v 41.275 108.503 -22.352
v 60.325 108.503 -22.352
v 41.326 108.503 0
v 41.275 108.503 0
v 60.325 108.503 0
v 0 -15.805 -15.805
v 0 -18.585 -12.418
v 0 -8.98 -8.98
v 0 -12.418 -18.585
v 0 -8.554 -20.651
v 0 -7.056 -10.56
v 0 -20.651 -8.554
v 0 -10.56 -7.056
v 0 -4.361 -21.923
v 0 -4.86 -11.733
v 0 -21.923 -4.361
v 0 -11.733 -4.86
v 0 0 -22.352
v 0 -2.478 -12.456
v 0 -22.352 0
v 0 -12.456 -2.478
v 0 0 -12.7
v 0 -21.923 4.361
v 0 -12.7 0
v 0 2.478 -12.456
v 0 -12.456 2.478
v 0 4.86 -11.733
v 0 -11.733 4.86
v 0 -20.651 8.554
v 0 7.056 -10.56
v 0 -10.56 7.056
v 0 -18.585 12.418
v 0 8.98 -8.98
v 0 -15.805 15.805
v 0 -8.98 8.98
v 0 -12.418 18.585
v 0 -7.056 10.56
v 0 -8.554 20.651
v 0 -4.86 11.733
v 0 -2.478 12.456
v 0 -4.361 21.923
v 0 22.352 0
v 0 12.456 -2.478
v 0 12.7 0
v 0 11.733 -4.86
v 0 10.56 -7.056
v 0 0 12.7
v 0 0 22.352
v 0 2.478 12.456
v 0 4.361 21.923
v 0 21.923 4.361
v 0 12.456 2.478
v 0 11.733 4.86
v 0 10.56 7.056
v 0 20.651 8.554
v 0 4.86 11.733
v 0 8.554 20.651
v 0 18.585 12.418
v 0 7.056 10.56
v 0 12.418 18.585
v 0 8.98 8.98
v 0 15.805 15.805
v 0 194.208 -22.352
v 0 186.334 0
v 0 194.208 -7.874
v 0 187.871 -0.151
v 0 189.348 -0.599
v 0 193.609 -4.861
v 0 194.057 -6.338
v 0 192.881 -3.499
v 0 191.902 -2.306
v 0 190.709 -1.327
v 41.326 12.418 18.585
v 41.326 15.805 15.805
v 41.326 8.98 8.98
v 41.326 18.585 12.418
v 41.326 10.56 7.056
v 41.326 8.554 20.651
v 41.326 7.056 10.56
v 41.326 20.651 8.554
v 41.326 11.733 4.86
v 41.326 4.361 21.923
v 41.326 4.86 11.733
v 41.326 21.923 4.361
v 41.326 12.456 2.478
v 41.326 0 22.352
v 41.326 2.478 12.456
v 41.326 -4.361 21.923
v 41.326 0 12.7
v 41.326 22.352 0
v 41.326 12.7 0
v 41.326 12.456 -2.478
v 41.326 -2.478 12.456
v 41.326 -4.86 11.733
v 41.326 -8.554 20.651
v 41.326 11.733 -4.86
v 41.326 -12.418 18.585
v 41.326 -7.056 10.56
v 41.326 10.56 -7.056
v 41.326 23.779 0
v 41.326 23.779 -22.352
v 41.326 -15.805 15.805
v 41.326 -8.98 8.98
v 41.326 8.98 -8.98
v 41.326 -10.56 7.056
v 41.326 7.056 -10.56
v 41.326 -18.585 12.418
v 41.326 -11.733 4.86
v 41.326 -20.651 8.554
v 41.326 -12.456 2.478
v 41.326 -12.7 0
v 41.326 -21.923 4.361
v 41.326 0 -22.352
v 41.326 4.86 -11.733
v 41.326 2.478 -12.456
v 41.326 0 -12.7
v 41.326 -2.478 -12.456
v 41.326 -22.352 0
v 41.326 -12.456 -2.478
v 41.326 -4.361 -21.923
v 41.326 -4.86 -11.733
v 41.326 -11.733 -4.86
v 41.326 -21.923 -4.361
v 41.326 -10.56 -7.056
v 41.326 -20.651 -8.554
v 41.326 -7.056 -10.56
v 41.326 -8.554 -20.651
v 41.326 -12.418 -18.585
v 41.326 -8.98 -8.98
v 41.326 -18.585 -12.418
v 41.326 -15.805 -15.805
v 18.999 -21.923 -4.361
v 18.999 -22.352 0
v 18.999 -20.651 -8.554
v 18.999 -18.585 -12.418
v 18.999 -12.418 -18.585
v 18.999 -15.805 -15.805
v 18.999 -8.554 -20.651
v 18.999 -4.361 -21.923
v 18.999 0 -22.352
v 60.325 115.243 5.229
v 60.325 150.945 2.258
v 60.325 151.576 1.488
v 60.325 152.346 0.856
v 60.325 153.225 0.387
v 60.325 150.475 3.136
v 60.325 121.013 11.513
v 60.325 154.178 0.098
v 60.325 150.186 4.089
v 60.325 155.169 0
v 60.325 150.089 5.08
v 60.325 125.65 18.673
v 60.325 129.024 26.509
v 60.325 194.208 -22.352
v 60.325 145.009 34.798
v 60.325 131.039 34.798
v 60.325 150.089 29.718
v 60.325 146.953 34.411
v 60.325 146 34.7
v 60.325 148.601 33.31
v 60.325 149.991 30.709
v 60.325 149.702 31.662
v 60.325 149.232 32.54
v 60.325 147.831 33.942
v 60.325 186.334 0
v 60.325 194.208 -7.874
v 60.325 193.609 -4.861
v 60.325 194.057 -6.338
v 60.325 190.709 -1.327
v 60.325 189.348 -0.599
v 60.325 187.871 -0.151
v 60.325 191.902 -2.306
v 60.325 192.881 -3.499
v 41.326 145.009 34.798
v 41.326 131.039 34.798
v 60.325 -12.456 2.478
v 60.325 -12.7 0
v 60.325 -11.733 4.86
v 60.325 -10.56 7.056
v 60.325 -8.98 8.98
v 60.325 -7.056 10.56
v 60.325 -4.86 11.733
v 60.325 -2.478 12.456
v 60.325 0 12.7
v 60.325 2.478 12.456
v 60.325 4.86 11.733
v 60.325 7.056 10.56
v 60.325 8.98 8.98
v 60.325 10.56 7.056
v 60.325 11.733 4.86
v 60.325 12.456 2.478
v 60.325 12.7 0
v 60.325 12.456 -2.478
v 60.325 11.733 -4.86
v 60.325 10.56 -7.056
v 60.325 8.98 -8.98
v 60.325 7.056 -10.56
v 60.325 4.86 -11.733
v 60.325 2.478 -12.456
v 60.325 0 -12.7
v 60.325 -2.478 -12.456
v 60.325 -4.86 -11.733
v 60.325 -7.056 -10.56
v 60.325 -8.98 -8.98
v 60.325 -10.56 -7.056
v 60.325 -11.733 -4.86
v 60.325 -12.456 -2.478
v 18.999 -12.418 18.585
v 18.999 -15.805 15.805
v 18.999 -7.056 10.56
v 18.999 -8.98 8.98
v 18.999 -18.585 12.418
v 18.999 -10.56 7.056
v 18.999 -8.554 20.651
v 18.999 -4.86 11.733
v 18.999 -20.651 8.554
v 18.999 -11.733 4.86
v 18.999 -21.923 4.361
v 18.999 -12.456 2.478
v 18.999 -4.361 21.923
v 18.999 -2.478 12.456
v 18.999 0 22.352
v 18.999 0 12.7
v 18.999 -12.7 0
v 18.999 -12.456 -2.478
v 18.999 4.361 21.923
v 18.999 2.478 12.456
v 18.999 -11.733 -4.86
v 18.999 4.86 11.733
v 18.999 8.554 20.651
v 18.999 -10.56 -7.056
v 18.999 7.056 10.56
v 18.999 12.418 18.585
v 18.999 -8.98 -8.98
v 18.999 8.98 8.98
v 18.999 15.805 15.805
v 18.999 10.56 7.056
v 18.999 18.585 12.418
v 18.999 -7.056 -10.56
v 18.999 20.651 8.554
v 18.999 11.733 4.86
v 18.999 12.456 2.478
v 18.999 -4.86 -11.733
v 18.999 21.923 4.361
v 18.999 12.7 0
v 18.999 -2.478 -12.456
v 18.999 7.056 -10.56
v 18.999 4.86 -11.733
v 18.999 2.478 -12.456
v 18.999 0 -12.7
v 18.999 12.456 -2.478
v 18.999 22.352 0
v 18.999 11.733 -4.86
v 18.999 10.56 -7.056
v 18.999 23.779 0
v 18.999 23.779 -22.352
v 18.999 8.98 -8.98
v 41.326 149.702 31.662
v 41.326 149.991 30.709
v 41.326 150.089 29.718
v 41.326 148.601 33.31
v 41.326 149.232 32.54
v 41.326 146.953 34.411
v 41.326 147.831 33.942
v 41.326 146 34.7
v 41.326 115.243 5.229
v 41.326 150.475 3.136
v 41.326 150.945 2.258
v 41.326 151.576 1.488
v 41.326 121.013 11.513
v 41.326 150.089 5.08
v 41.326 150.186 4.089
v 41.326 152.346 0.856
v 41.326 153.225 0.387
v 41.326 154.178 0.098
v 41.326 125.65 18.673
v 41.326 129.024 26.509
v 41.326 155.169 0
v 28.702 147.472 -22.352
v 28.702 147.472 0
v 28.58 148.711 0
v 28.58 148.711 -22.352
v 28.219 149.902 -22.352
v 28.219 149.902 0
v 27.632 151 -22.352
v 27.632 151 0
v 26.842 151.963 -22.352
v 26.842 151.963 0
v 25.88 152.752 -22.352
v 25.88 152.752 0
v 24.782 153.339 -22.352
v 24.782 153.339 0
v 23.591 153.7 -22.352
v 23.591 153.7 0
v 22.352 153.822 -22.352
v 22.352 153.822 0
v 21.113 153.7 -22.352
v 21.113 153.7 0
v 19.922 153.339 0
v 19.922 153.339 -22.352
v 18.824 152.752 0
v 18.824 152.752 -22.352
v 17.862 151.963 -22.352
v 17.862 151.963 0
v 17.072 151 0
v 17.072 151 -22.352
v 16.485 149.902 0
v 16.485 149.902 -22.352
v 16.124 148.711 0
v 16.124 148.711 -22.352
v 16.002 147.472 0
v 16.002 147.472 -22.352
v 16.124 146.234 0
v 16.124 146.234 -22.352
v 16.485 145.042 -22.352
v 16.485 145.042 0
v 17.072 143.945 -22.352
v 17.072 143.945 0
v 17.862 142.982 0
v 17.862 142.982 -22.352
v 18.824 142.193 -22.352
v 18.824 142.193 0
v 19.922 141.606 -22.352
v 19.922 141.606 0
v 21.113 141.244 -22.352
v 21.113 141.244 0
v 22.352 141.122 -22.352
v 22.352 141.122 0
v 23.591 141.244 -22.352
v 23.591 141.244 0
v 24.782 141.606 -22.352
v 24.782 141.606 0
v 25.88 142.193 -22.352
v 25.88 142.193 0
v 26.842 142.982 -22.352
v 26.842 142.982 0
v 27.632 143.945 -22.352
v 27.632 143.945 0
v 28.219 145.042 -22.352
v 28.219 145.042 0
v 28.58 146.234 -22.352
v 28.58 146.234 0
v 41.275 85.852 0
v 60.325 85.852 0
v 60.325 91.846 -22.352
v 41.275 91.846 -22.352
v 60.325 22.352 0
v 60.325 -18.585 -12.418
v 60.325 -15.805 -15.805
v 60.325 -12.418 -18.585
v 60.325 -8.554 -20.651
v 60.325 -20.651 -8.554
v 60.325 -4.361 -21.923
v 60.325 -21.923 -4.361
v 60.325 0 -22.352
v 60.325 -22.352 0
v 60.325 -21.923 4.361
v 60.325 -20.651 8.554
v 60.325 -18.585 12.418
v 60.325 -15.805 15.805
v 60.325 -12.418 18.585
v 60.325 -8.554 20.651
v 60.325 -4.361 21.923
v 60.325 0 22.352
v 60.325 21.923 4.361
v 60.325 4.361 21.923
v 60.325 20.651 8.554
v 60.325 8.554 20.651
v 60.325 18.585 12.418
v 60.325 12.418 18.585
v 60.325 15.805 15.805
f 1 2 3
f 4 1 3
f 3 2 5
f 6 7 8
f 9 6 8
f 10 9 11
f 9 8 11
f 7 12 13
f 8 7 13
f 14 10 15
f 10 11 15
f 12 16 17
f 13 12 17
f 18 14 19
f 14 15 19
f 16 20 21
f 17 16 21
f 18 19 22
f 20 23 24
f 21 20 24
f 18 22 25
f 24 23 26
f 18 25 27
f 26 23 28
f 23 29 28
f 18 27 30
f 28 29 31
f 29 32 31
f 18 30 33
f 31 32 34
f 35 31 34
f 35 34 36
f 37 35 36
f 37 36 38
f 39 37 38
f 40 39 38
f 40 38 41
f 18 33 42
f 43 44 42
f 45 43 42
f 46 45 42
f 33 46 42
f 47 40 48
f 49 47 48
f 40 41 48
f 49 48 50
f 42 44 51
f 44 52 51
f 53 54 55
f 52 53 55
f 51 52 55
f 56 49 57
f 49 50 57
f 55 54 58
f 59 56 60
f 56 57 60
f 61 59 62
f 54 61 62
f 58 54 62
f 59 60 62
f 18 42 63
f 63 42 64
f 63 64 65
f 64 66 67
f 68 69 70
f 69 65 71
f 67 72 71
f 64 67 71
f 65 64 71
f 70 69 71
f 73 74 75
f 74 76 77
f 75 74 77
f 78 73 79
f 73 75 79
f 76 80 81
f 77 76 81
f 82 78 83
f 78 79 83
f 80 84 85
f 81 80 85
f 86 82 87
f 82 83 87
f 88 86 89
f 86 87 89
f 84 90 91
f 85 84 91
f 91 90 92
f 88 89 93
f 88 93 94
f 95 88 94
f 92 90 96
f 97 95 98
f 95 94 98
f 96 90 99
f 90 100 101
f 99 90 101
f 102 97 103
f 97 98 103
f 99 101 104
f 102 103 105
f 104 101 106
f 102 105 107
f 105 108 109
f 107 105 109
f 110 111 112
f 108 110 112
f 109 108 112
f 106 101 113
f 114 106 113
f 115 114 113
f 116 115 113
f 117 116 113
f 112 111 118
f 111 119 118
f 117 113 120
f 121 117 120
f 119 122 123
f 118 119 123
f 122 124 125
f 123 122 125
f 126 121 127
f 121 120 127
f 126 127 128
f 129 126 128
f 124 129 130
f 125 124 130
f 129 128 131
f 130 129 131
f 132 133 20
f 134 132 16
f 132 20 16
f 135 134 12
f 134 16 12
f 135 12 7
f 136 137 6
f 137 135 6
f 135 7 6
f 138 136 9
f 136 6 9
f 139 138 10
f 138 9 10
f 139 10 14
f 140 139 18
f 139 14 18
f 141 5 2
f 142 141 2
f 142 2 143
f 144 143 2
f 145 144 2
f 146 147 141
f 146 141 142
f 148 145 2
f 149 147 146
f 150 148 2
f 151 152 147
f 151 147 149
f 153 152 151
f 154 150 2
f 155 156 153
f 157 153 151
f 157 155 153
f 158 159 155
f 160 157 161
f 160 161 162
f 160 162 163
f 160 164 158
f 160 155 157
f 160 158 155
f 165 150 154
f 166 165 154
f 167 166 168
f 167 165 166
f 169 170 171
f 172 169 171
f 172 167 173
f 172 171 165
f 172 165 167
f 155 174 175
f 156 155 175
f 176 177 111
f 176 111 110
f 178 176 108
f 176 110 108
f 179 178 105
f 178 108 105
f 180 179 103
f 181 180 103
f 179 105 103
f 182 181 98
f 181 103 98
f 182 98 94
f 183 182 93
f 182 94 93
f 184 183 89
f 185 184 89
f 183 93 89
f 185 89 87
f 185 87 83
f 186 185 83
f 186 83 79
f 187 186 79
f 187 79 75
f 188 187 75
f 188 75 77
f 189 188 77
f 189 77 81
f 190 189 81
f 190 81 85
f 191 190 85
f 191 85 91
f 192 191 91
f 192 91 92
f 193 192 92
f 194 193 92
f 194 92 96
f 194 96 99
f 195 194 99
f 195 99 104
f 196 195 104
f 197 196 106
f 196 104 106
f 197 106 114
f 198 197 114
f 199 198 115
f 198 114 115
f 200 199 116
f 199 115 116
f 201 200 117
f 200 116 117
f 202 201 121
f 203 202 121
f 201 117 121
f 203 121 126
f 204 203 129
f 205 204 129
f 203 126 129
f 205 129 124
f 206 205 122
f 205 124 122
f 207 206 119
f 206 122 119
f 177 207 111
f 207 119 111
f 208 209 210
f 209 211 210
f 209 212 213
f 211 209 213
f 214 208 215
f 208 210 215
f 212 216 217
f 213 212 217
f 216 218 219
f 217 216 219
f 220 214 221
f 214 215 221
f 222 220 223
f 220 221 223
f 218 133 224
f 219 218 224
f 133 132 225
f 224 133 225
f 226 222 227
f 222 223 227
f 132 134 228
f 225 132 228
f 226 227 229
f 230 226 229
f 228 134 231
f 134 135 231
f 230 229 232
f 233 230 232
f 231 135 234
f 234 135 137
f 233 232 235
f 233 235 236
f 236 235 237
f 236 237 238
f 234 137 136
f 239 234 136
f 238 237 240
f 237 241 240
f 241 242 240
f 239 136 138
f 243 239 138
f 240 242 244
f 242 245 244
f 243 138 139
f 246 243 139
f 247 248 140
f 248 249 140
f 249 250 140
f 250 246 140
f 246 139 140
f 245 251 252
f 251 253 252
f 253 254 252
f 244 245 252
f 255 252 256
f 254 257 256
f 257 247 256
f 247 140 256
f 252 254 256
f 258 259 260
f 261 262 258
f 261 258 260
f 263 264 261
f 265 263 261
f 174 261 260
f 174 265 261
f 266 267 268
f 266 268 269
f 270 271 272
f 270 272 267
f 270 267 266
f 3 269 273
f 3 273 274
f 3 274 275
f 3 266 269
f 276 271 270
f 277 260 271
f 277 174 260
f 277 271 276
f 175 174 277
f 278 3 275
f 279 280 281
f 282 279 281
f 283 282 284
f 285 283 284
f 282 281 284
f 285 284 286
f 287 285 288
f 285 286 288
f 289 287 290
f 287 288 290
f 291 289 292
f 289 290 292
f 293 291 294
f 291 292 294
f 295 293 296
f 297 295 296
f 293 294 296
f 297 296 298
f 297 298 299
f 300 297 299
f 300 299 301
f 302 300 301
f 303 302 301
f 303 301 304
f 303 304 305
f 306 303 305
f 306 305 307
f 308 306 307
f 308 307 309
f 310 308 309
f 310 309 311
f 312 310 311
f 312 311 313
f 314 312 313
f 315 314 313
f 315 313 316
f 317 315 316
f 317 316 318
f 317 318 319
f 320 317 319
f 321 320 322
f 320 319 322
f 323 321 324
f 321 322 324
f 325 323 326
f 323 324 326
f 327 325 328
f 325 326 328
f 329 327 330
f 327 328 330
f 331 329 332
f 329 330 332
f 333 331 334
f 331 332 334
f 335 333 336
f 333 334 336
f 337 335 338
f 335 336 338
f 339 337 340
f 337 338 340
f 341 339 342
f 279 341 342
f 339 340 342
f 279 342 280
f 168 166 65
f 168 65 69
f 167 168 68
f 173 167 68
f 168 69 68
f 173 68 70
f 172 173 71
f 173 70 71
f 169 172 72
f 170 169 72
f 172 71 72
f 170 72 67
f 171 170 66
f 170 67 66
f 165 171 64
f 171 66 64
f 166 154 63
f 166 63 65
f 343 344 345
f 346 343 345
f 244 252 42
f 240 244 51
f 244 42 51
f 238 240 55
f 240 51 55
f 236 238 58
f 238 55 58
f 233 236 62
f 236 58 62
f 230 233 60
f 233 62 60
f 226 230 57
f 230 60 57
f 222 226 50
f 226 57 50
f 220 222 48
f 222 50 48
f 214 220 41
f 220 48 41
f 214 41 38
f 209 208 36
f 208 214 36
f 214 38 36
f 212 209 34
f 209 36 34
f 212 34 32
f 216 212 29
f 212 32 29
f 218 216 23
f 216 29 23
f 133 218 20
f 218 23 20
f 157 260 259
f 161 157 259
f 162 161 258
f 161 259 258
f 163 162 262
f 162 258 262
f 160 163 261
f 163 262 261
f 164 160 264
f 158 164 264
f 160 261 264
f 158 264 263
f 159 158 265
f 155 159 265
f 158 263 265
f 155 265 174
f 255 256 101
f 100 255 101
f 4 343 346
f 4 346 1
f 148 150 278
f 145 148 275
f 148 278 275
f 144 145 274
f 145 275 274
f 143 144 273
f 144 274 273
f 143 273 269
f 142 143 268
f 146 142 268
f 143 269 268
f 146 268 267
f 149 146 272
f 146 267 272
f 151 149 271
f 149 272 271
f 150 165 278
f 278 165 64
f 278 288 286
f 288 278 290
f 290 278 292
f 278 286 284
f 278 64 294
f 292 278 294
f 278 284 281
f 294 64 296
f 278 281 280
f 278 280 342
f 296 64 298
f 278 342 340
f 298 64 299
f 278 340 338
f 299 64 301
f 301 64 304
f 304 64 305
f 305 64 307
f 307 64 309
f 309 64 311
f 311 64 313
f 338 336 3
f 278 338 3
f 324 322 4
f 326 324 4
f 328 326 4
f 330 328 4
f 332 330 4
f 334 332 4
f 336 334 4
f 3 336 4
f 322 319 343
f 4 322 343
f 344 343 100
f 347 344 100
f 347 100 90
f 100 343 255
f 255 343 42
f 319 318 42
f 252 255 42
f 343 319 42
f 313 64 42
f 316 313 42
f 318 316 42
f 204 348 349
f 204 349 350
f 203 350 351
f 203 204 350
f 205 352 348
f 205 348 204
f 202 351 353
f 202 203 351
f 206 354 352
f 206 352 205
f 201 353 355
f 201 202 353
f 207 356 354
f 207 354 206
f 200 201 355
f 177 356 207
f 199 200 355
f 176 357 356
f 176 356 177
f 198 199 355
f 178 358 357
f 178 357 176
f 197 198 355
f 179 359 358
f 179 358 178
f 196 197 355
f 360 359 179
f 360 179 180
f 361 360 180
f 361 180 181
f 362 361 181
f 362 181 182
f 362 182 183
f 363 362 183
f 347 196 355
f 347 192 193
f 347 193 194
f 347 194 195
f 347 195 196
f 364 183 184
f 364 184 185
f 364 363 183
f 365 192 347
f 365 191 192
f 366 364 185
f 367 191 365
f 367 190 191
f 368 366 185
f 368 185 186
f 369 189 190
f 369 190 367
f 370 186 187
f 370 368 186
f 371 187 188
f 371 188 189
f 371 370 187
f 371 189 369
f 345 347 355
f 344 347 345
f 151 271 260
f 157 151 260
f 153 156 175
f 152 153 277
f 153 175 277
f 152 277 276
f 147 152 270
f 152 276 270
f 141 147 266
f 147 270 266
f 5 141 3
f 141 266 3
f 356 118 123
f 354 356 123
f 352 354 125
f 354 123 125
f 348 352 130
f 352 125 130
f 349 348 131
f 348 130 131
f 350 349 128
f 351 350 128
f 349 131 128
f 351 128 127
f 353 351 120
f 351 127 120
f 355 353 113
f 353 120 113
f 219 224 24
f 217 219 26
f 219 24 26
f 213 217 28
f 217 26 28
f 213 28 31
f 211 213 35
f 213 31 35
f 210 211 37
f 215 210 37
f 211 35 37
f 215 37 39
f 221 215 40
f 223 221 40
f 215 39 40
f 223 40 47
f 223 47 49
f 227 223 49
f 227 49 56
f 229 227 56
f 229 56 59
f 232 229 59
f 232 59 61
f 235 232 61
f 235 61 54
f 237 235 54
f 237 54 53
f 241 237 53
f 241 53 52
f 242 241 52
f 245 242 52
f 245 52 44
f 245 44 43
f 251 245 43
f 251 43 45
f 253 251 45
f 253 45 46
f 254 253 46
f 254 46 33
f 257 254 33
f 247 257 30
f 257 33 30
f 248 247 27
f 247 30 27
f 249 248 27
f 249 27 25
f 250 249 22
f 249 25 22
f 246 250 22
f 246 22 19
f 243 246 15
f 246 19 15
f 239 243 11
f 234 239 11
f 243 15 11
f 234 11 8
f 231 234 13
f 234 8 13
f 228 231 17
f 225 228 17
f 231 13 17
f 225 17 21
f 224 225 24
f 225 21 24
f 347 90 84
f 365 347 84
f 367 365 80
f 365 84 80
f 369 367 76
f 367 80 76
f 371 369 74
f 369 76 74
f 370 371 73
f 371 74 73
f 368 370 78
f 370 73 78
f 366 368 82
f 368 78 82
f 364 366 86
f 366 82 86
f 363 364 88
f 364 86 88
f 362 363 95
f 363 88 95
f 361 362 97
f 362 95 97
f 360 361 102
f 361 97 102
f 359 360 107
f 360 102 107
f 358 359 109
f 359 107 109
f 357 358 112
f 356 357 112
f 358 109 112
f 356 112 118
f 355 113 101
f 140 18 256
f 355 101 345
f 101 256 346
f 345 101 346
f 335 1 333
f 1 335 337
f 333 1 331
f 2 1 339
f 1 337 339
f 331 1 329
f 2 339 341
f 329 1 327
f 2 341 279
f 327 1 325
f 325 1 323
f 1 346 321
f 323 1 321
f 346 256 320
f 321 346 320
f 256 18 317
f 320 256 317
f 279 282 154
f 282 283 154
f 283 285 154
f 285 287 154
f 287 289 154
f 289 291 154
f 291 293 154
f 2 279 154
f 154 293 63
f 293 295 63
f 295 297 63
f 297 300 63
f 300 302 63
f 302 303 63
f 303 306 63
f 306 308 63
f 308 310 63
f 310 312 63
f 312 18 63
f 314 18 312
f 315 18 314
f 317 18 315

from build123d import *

# Parameters (mm, degrees)
F1_DEPTH  = 60.325
F3_DEPTH  = 41.3258
F5_DEPTH  = 19.05
F6_R      = 6.35
F7_DEPTH  = 22.353
F8_R      = 12.7
F9_DEPTH  = 60.326
F10_W     = 22.3266
F10_H     = 22.457045
F10_H_2   = 23.779094
F11_DEPTH = 57.151


with BuildPart() as f1:
    # F0 (on Right) → F1 (new body)
    with BuildSketch(Plane.YZ):
        with BuildLine():
            Line((108.502969, 0), (22.352, 0))
            ThreePointArc((22.352, 0), (0, 22.352), (-22.352, 0))
            ThreePointArc((-22.352, 0), (-15.805251, -15.805251), (0, -22.352))
            Line((0, -22.352), (194.2084, -22.352))
            Line((194.2084, -22.352), (194.2084, -7.874))
            ThreePointArc((194.2084, -7.874), (191.902159, -2.306241), (186.3344, 0))
            Line((186.3344, 0), (155.1686, 0))
            ThreePointArc((155.1686, 0), (151.576498, 1.487898), (150.0886, 5.08))
            Line((150.0886, 5.08), (150.0886, 29.718))
            ThreePointArc((150.0886, 29.718), (148.600702, 33.310102), (145.0086, 34.798))
            Line((145.0086, 34.798), (131.0386, 34.798))
            ThreePointArc((131.0386, 34.798), (123.482134, 14.995483), (108.502969, 0))
        make_face()
    extrude(amount=F1_DEPTH)

    # F2 (on face) → F3 (cut)
    with BuildSketch(Plane(origin=(0, 0, 0), x_dir=(0, -1, 0), z_dir=(-1, 0, 0))):
        with BuildLine():
            ThreePointArc((-150.0886, 5.08), (-151.576498, 1.487898), (-155.1686, 0))
            Line((-155.1686, 0), (-108.502969, 0))
            ThreePointArc((-108.502969, 0), (-123.482134, 14.995483), (-131.0386, 34.798))
            Line((-131.0386, 34.798), (-145.0086, 34.798))
            ThreePointArc((-145.0086, 34.798), (-148.600702, 33.310102), (-150.0886, 29.718))
            Line((-150.0886, 29.718), (-150.0886, 5.08))
        make_face()
    extrude(amount=-F3_DEPTH, mode=Mode.SUBTRACT)

    # F4 (on face) → F5 (cut)
    with BuildSketch(Plane.YZ.offset(60.325)):
        Polygon((108.502969, -22.352), (108.502969, 0), (85.852, 0), (91.8464, -22.352), align=None)
    extrude(amount=-F5_DEPTH, mode=Mode.SUBTRACT)

    # F6 (on face) → F7 (cut, through all)
    with BuildSketch(Plane.XY):
        with Locations((22.352, 147.4724)):
            Circle(F6_R)
    extrude(amount=-F7_DEPTH, mode=Mode.SUBTRACT)

    # F8 (on face) → F9 (cut, through all)
    with BuildSketch(Plane(origin=(0, 0, 0), x_dir=(0, -1, 0), z_dir=(-1, 0, 0))):
        Circle(F8_R)
    extrude(amount=-F9_DEPTH, mode=Mode.SUBTRACT)

    # F10 (on face) → F11 (cut, through all)
    with BuildSketch(Plane(origin=(0, 0, -22.352), x_dir=(1, 0, 0), z_dir=(0, 0, -1))):
        with Locations((30.1625, 11.228522)):
            Rectangle(F10_W, F10_H)
        with Locations((30.1625, -11.889547)):
            Rectangle(F10_W, F10_H_2)
    extrude(amount=-F11_DEPTH, mode=Mode.SUBTRACT)


solid = f1.part
